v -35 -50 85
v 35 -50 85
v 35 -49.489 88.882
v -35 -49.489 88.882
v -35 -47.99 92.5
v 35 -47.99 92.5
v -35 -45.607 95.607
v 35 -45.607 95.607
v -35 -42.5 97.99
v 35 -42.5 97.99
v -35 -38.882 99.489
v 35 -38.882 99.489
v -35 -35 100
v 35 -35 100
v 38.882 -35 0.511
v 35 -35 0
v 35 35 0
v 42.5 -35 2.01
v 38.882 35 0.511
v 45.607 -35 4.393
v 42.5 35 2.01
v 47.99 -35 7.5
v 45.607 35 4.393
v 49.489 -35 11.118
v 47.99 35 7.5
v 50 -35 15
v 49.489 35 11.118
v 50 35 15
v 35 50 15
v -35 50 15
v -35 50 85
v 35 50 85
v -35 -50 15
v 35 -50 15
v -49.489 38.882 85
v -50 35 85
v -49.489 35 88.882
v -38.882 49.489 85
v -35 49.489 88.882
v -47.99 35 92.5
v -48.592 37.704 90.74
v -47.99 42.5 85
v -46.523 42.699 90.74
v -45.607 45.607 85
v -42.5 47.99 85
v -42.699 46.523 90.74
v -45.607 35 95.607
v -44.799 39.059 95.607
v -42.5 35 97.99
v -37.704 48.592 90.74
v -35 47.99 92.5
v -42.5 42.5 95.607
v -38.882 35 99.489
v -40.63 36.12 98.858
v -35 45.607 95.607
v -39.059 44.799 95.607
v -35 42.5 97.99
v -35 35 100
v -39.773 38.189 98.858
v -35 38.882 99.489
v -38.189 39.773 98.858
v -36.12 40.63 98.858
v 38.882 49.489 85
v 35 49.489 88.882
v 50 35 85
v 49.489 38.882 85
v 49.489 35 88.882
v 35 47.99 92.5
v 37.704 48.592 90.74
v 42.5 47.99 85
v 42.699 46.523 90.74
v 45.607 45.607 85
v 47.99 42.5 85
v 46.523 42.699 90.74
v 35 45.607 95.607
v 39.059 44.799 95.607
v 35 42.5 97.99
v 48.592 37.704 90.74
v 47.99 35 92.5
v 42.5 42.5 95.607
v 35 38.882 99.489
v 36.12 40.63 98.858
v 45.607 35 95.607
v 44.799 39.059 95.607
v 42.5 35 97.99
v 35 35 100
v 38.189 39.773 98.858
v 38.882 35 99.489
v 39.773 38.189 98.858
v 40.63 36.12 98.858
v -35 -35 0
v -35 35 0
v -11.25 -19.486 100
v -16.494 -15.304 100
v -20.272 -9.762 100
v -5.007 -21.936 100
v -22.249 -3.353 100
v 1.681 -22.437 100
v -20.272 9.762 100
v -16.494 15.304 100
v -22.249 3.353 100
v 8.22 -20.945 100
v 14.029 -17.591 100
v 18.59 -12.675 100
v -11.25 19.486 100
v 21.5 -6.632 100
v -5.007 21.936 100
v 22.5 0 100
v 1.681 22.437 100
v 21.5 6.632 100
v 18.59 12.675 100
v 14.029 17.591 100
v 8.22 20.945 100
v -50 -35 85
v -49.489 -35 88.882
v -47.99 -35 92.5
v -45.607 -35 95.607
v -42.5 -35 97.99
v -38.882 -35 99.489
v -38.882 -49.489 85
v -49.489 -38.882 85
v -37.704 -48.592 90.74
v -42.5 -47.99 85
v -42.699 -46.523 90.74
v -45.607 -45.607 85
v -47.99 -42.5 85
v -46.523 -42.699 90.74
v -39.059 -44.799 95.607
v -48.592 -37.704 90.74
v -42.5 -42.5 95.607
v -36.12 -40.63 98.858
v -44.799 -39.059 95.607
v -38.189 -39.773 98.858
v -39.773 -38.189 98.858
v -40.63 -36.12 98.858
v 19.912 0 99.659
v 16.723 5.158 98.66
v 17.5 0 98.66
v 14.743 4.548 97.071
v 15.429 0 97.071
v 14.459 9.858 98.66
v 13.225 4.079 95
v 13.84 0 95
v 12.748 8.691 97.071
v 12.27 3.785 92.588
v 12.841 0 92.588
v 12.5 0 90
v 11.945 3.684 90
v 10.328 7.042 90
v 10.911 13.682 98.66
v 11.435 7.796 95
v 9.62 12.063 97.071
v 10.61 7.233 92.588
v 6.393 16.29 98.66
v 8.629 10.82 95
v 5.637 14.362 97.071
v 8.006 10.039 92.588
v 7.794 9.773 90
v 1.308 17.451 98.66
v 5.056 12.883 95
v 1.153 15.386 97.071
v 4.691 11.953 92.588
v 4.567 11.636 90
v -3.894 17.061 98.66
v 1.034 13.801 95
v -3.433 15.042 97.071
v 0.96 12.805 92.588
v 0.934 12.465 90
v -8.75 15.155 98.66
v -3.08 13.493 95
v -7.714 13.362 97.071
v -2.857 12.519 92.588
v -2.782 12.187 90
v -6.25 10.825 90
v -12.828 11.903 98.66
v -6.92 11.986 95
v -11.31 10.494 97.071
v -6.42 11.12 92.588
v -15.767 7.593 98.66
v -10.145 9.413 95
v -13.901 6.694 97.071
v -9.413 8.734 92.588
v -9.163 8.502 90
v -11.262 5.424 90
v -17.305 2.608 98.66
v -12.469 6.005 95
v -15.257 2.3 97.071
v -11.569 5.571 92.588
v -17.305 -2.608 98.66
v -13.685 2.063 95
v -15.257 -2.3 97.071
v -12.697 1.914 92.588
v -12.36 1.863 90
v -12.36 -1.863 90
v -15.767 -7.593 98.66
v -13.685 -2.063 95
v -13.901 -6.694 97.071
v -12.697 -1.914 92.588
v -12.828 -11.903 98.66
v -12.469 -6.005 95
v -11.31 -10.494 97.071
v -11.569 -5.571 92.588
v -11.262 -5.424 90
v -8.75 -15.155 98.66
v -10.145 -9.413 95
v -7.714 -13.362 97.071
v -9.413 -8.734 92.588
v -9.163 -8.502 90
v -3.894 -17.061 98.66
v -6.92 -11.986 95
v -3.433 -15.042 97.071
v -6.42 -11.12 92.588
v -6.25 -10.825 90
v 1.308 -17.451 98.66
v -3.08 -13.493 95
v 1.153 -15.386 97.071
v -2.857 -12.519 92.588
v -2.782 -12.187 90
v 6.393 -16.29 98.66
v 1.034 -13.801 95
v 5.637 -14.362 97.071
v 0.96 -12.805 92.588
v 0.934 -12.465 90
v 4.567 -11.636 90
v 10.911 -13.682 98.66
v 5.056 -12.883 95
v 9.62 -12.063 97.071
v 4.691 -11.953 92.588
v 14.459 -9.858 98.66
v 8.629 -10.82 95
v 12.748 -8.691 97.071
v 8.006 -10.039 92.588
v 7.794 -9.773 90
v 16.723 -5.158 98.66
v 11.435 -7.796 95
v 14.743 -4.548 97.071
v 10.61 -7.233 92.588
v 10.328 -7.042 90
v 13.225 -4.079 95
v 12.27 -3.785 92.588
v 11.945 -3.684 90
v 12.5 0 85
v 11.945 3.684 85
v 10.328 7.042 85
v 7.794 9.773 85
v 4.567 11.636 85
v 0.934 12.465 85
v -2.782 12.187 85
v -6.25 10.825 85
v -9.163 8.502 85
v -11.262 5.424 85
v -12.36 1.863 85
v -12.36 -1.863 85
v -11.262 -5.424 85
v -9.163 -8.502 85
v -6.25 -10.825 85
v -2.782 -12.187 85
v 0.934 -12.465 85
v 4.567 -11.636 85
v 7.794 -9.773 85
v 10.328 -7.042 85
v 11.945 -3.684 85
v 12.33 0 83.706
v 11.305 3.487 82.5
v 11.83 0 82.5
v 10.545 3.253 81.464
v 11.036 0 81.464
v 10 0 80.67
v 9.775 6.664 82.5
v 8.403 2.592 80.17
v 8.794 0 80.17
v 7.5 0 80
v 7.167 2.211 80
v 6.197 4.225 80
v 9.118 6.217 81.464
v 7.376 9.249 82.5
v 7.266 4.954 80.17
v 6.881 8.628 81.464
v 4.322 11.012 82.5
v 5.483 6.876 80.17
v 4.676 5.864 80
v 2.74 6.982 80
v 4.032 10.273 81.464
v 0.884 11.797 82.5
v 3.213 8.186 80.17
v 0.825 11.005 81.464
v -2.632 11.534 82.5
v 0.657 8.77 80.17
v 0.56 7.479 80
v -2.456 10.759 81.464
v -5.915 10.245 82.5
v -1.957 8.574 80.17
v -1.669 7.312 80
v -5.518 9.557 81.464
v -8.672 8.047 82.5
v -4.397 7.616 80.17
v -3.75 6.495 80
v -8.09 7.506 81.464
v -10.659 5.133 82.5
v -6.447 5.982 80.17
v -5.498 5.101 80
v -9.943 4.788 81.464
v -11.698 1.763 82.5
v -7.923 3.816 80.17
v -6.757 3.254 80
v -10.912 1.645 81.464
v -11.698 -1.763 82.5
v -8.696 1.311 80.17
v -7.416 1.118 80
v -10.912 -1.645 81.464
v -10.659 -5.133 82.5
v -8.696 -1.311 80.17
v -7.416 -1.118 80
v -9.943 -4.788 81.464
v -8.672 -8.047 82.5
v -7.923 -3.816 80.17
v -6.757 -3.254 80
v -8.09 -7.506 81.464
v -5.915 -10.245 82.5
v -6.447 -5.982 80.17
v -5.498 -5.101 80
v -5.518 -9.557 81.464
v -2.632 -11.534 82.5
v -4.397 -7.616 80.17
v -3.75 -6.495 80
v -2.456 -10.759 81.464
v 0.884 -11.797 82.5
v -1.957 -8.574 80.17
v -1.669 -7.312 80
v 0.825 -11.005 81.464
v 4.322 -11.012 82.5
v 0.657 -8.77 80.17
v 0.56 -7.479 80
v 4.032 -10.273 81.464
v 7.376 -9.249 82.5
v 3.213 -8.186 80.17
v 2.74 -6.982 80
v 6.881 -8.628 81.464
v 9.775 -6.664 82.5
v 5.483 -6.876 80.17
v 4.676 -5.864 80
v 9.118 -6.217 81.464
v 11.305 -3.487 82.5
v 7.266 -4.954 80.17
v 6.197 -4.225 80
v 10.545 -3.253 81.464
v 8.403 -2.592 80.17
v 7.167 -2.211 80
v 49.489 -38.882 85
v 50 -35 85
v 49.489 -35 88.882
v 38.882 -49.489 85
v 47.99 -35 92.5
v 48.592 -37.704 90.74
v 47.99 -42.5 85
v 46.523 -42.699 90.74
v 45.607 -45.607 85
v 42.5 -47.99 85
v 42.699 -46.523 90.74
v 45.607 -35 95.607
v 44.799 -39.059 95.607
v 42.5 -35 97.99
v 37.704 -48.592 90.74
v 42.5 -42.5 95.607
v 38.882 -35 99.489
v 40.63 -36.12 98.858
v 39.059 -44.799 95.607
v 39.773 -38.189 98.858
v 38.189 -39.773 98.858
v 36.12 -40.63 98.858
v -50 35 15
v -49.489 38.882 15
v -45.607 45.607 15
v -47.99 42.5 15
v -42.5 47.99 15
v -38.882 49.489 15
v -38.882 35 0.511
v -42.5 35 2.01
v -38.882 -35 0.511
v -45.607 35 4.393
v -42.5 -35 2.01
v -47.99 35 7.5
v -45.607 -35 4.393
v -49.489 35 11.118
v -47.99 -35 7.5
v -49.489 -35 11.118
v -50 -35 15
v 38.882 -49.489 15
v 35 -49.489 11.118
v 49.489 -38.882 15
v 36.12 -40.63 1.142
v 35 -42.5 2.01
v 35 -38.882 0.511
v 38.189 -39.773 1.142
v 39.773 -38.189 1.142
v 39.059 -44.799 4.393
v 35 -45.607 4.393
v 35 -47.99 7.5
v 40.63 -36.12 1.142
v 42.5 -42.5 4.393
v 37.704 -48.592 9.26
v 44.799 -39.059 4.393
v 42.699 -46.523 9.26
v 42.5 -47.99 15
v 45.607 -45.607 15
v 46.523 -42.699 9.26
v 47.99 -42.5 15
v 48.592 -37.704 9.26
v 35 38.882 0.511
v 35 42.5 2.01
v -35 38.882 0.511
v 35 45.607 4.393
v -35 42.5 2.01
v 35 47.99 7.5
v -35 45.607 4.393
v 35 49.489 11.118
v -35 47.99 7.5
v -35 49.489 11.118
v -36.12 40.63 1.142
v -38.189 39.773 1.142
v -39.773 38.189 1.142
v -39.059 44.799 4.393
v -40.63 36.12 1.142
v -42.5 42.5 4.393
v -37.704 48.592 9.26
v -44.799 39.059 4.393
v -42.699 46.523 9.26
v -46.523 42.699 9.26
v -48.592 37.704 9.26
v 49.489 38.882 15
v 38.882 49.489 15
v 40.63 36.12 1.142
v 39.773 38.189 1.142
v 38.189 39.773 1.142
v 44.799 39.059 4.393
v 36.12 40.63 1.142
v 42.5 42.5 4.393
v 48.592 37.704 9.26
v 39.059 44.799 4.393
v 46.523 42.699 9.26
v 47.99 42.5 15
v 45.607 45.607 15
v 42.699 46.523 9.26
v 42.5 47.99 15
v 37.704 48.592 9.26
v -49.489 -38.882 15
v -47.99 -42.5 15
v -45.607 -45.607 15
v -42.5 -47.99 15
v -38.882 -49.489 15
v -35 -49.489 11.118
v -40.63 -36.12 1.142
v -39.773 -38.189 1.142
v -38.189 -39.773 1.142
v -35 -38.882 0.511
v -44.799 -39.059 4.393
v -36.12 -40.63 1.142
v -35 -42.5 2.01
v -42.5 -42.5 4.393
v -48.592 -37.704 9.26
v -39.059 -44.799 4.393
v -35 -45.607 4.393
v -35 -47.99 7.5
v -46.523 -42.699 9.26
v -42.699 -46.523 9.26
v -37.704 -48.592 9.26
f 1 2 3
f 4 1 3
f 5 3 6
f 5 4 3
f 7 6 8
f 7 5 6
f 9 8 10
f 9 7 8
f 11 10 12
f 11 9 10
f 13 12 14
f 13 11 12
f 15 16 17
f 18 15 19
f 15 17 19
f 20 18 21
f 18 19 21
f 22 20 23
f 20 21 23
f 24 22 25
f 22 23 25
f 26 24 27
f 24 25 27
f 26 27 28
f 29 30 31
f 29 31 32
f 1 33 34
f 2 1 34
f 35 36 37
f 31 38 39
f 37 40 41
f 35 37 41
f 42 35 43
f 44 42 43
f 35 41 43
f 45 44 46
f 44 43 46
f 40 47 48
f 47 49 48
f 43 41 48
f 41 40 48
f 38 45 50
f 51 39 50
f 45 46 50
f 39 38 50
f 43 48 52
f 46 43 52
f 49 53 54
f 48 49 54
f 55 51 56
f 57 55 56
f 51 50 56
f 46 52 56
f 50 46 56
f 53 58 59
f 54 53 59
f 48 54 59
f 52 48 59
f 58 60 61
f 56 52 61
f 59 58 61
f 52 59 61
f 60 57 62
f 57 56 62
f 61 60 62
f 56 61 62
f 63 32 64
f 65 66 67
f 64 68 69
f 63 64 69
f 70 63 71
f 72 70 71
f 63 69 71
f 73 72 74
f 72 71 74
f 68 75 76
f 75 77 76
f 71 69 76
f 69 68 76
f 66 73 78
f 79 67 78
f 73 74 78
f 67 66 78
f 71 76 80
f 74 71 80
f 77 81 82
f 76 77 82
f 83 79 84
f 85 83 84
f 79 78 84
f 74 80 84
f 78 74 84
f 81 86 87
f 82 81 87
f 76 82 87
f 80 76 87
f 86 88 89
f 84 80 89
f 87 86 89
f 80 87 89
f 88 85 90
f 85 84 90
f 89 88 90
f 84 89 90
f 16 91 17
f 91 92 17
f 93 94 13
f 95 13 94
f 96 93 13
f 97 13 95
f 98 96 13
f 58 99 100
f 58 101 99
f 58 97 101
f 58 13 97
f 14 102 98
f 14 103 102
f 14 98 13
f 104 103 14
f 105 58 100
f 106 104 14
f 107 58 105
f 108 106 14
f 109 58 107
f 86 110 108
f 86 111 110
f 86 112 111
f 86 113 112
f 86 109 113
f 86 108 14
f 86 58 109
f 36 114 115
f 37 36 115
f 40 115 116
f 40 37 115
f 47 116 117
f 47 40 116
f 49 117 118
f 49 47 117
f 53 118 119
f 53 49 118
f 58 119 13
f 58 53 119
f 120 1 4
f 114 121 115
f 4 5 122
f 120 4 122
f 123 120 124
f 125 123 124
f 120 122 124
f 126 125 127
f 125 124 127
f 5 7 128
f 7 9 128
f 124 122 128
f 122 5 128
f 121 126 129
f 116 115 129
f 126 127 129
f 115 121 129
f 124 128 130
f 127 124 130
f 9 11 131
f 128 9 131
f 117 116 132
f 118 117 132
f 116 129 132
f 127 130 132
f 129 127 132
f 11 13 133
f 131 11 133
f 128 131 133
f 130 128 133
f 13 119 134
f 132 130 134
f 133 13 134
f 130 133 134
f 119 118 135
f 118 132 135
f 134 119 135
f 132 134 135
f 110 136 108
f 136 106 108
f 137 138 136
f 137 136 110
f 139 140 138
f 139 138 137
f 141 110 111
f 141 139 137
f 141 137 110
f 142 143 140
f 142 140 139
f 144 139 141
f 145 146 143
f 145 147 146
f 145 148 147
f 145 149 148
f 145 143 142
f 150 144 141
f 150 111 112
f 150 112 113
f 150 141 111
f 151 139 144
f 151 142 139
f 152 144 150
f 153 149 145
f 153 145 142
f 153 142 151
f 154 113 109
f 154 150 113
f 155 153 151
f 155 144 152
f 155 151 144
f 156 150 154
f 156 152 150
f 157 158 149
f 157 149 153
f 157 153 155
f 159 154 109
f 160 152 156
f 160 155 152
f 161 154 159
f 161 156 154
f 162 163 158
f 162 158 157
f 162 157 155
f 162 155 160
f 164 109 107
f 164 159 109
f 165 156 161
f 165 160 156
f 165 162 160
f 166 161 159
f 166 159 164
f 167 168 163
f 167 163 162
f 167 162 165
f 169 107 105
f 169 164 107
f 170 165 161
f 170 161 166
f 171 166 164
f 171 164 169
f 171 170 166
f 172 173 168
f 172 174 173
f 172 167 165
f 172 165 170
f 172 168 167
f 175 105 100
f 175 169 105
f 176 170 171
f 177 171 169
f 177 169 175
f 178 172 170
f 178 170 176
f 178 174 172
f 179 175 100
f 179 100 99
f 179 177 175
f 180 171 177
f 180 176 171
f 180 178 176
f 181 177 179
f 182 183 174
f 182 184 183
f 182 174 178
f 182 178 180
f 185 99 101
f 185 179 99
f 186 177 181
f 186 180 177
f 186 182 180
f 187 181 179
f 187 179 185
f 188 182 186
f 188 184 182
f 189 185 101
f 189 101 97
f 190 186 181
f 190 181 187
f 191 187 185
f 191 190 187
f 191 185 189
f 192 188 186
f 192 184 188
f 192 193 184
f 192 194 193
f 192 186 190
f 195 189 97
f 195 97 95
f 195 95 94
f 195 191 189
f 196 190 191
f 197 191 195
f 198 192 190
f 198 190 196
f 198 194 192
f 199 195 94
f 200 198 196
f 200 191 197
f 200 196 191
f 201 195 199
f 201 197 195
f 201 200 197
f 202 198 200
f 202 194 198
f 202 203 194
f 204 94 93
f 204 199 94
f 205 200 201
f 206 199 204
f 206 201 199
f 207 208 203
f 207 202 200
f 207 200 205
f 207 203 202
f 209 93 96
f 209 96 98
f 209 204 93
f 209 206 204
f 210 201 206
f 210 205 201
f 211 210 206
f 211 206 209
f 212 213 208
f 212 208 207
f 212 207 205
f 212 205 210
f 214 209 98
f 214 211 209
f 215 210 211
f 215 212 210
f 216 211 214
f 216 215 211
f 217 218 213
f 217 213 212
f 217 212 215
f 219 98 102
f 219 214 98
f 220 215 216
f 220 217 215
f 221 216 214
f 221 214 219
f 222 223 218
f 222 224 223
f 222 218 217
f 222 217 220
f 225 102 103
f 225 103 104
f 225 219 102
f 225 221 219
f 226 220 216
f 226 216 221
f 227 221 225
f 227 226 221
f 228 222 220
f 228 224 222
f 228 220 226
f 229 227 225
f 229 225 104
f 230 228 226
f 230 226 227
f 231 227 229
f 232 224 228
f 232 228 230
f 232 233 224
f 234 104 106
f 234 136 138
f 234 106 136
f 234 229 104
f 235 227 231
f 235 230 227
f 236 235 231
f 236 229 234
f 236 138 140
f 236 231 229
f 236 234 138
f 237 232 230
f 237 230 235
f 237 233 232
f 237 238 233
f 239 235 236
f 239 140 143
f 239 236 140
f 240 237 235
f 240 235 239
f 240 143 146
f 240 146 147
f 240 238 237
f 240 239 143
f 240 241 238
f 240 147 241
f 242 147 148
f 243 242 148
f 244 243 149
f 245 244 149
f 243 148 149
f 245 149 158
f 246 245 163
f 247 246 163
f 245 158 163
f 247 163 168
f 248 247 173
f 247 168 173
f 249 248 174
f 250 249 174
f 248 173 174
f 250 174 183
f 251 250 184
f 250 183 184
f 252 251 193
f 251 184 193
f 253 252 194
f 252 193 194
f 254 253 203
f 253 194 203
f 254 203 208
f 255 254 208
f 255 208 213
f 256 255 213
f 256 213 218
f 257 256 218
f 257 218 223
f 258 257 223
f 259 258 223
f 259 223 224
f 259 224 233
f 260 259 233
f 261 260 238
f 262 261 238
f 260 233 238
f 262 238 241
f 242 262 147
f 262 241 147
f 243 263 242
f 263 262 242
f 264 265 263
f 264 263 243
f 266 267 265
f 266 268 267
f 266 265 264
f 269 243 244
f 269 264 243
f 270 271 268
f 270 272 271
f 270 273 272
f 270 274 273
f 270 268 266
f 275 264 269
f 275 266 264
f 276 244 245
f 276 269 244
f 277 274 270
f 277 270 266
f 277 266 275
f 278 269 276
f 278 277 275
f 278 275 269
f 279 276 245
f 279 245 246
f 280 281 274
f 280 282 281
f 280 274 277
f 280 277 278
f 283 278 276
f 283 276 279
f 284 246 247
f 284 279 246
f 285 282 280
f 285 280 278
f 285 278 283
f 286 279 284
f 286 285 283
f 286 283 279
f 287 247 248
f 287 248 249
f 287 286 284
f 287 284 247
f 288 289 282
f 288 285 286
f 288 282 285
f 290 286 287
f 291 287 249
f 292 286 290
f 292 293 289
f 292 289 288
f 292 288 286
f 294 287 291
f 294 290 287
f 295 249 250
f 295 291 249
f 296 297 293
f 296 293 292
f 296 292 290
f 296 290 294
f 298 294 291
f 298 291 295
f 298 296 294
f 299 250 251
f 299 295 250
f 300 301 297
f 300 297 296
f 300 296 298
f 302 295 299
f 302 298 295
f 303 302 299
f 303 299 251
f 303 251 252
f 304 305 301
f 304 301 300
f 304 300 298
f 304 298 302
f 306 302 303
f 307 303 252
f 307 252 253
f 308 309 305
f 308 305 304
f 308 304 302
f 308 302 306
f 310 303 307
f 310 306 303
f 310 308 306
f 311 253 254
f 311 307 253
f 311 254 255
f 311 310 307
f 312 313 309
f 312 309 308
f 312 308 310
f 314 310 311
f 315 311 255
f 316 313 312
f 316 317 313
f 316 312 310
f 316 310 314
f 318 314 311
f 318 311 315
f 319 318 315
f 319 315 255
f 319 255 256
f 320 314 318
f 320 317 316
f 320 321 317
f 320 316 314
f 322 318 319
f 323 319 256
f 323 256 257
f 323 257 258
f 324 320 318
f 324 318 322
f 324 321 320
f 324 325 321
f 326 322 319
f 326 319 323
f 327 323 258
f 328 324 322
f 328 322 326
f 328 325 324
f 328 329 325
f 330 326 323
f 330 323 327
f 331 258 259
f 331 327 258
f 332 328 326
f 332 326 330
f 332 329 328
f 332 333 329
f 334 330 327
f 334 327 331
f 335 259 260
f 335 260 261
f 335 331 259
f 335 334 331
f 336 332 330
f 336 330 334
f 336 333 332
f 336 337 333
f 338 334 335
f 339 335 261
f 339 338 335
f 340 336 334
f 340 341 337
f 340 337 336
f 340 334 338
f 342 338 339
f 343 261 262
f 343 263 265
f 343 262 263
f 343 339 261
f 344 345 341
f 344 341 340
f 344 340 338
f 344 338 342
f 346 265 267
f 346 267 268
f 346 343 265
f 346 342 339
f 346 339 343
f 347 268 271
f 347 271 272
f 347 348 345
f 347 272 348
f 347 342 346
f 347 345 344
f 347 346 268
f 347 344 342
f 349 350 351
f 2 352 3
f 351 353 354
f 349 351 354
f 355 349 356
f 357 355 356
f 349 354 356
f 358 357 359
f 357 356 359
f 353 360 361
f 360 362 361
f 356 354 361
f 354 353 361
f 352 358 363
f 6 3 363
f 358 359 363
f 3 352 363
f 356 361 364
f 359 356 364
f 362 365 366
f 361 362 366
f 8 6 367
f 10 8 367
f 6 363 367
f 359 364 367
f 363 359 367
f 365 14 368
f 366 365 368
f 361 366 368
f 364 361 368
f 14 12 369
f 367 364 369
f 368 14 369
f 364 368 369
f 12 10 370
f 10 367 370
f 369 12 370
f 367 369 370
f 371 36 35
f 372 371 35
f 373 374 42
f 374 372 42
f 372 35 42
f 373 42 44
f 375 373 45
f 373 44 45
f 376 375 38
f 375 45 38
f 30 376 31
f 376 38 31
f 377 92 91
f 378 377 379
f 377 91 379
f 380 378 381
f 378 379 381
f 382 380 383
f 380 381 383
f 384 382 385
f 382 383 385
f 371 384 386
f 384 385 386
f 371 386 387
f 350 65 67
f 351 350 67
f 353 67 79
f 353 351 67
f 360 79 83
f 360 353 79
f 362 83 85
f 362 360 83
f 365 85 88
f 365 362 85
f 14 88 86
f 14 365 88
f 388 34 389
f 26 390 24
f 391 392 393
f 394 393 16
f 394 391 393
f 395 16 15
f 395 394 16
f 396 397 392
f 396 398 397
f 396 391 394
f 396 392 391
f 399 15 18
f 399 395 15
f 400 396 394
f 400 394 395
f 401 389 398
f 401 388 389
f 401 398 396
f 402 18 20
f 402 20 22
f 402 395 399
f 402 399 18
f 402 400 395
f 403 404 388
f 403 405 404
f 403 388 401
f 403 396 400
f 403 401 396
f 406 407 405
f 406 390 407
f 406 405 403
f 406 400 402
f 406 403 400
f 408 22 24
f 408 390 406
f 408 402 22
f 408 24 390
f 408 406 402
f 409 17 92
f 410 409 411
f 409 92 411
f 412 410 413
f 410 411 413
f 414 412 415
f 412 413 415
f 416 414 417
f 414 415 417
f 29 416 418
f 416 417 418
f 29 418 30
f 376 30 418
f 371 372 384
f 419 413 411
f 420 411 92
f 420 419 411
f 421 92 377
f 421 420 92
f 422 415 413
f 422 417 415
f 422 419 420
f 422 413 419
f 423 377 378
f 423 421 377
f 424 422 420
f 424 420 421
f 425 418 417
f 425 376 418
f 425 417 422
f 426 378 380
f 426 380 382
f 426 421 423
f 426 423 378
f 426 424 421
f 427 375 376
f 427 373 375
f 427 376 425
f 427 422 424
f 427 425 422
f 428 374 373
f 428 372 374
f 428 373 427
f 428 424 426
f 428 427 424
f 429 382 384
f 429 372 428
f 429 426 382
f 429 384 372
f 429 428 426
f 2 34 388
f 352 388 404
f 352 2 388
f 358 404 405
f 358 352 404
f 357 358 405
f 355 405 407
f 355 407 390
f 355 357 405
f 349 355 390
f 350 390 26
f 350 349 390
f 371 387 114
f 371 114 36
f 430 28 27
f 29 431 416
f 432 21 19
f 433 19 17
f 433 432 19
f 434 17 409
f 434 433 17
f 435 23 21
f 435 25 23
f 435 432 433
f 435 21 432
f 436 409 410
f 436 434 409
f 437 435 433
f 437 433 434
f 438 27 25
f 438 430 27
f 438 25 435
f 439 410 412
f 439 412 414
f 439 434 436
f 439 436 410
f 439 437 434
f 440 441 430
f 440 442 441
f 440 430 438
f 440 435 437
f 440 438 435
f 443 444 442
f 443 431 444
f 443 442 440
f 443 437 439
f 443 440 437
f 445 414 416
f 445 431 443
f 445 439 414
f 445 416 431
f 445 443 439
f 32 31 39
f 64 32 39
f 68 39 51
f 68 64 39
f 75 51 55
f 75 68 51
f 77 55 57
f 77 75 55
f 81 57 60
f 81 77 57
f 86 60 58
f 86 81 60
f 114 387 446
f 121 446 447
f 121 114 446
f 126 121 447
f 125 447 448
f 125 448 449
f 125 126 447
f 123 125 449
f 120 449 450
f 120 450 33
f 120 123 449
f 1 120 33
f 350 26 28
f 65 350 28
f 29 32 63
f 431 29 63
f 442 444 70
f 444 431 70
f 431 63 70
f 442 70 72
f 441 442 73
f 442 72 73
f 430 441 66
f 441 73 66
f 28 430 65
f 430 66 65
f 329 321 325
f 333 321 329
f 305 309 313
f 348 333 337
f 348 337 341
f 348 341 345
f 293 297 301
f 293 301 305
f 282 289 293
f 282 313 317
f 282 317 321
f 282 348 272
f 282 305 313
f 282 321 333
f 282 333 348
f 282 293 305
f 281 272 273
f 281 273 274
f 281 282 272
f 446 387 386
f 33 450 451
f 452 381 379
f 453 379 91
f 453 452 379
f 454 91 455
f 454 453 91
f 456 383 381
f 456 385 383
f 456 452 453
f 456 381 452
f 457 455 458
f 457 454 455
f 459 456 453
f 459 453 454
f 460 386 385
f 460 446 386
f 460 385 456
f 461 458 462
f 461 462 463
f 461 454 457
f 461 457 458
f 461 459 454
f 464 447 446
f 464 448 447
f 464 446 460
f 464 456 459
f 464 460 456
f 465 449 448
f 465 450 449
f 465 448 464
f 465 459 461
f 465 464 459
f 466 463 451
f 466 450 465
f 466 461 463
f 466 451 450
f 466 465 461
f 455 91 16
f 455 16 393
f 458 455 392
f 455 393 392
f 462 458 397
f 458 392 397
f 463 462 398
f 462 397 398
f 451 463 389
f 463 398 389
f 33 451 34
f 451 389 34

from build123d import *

# Parameters (mm, degrees)
SKETCH001_W  = 100
SKETCH001_H  = 100
PAD_DEPTH    = 100
SKETCH_R     = 12.5
POCKET_DEPTH = 20
FILLET_R     = 15
FILLET001_R  = 15
FILLET002_R  = 15
FILLET003_R  = 10
FILLET004_R  = 5


with BuildPart() as part:
    # Sketch001 → Pad (new body)
    with BuildSketch(Plane.XY):
        Rectangle(SKETCH001_W, SKETCH001_H)
    extrude(amount=PAD_DEPTH)

    # Sketch (on Face6 of Pad) → Pocket (cut)
    with BuildSketch(Plane.XY.offset(100)):
        Circle(SKETCH_R)
    extrude(amount=-POCKET_DEPTH, mode=Mode.SUBTRACT)

    # Fillet
    fillet_edges = [part.edges().sort_by_distance(p)[0] for p in [
        (50, -50, 50),
        (-50, -50, 50),
        (50, 50, 50),
        (-50, 50, 50),
    ]]
    fillet(fillet_edges, radius=FILLET_R)

    # Fillet001
    fillet001_edges = [part.edges().sort_by_distance(p)[0] for p in [
        (-50, 0, 100),
        (-45.606602, 45.606602, 100),
        (0, 50, 100),
        (45.606602, 45.606602, 100),
        (50, 0, 100),
        (45.606602, -45.606602, 100),
        (0, -50, 100),
        (-45.606602, -45.606602, 100),
    ]]
    fillet(fillet001_edges, radius=FILLET001_R)

    # Fillet002
    fillet002_edges = [part.edges().sort_by_distance(p)[0] for p in [
        (0, -50, 0),
        (-45.606602, -45.606602, 0),
        (-50, 0, 0),
        (-45.606602, 45.606602, 0),
        (0, 50, 0),
        (45.606602, 45.606602, 0),
        (50, 0, 0),
        (45.606602, -45.606602, 0),
    ]]
    fillet(fillet002_edges, radius=FILLET002_R)

    # Fillet003
    fillet003_edges = [part.edges().sort_by_distance(p)[0] for p in [
        (-12.5, 0, 100),
    ]]
    fillet(fillet003_edges, radius=FILLET003_R)

    # Fillet004
    fillet004_edges = [part.edges().sort_by_distance(p)[0] for p in [
        (-12.5, 0, 80),
    ]]
    fillet(fillet004_edges, radius=FILLET004_R)


solid = part.part
